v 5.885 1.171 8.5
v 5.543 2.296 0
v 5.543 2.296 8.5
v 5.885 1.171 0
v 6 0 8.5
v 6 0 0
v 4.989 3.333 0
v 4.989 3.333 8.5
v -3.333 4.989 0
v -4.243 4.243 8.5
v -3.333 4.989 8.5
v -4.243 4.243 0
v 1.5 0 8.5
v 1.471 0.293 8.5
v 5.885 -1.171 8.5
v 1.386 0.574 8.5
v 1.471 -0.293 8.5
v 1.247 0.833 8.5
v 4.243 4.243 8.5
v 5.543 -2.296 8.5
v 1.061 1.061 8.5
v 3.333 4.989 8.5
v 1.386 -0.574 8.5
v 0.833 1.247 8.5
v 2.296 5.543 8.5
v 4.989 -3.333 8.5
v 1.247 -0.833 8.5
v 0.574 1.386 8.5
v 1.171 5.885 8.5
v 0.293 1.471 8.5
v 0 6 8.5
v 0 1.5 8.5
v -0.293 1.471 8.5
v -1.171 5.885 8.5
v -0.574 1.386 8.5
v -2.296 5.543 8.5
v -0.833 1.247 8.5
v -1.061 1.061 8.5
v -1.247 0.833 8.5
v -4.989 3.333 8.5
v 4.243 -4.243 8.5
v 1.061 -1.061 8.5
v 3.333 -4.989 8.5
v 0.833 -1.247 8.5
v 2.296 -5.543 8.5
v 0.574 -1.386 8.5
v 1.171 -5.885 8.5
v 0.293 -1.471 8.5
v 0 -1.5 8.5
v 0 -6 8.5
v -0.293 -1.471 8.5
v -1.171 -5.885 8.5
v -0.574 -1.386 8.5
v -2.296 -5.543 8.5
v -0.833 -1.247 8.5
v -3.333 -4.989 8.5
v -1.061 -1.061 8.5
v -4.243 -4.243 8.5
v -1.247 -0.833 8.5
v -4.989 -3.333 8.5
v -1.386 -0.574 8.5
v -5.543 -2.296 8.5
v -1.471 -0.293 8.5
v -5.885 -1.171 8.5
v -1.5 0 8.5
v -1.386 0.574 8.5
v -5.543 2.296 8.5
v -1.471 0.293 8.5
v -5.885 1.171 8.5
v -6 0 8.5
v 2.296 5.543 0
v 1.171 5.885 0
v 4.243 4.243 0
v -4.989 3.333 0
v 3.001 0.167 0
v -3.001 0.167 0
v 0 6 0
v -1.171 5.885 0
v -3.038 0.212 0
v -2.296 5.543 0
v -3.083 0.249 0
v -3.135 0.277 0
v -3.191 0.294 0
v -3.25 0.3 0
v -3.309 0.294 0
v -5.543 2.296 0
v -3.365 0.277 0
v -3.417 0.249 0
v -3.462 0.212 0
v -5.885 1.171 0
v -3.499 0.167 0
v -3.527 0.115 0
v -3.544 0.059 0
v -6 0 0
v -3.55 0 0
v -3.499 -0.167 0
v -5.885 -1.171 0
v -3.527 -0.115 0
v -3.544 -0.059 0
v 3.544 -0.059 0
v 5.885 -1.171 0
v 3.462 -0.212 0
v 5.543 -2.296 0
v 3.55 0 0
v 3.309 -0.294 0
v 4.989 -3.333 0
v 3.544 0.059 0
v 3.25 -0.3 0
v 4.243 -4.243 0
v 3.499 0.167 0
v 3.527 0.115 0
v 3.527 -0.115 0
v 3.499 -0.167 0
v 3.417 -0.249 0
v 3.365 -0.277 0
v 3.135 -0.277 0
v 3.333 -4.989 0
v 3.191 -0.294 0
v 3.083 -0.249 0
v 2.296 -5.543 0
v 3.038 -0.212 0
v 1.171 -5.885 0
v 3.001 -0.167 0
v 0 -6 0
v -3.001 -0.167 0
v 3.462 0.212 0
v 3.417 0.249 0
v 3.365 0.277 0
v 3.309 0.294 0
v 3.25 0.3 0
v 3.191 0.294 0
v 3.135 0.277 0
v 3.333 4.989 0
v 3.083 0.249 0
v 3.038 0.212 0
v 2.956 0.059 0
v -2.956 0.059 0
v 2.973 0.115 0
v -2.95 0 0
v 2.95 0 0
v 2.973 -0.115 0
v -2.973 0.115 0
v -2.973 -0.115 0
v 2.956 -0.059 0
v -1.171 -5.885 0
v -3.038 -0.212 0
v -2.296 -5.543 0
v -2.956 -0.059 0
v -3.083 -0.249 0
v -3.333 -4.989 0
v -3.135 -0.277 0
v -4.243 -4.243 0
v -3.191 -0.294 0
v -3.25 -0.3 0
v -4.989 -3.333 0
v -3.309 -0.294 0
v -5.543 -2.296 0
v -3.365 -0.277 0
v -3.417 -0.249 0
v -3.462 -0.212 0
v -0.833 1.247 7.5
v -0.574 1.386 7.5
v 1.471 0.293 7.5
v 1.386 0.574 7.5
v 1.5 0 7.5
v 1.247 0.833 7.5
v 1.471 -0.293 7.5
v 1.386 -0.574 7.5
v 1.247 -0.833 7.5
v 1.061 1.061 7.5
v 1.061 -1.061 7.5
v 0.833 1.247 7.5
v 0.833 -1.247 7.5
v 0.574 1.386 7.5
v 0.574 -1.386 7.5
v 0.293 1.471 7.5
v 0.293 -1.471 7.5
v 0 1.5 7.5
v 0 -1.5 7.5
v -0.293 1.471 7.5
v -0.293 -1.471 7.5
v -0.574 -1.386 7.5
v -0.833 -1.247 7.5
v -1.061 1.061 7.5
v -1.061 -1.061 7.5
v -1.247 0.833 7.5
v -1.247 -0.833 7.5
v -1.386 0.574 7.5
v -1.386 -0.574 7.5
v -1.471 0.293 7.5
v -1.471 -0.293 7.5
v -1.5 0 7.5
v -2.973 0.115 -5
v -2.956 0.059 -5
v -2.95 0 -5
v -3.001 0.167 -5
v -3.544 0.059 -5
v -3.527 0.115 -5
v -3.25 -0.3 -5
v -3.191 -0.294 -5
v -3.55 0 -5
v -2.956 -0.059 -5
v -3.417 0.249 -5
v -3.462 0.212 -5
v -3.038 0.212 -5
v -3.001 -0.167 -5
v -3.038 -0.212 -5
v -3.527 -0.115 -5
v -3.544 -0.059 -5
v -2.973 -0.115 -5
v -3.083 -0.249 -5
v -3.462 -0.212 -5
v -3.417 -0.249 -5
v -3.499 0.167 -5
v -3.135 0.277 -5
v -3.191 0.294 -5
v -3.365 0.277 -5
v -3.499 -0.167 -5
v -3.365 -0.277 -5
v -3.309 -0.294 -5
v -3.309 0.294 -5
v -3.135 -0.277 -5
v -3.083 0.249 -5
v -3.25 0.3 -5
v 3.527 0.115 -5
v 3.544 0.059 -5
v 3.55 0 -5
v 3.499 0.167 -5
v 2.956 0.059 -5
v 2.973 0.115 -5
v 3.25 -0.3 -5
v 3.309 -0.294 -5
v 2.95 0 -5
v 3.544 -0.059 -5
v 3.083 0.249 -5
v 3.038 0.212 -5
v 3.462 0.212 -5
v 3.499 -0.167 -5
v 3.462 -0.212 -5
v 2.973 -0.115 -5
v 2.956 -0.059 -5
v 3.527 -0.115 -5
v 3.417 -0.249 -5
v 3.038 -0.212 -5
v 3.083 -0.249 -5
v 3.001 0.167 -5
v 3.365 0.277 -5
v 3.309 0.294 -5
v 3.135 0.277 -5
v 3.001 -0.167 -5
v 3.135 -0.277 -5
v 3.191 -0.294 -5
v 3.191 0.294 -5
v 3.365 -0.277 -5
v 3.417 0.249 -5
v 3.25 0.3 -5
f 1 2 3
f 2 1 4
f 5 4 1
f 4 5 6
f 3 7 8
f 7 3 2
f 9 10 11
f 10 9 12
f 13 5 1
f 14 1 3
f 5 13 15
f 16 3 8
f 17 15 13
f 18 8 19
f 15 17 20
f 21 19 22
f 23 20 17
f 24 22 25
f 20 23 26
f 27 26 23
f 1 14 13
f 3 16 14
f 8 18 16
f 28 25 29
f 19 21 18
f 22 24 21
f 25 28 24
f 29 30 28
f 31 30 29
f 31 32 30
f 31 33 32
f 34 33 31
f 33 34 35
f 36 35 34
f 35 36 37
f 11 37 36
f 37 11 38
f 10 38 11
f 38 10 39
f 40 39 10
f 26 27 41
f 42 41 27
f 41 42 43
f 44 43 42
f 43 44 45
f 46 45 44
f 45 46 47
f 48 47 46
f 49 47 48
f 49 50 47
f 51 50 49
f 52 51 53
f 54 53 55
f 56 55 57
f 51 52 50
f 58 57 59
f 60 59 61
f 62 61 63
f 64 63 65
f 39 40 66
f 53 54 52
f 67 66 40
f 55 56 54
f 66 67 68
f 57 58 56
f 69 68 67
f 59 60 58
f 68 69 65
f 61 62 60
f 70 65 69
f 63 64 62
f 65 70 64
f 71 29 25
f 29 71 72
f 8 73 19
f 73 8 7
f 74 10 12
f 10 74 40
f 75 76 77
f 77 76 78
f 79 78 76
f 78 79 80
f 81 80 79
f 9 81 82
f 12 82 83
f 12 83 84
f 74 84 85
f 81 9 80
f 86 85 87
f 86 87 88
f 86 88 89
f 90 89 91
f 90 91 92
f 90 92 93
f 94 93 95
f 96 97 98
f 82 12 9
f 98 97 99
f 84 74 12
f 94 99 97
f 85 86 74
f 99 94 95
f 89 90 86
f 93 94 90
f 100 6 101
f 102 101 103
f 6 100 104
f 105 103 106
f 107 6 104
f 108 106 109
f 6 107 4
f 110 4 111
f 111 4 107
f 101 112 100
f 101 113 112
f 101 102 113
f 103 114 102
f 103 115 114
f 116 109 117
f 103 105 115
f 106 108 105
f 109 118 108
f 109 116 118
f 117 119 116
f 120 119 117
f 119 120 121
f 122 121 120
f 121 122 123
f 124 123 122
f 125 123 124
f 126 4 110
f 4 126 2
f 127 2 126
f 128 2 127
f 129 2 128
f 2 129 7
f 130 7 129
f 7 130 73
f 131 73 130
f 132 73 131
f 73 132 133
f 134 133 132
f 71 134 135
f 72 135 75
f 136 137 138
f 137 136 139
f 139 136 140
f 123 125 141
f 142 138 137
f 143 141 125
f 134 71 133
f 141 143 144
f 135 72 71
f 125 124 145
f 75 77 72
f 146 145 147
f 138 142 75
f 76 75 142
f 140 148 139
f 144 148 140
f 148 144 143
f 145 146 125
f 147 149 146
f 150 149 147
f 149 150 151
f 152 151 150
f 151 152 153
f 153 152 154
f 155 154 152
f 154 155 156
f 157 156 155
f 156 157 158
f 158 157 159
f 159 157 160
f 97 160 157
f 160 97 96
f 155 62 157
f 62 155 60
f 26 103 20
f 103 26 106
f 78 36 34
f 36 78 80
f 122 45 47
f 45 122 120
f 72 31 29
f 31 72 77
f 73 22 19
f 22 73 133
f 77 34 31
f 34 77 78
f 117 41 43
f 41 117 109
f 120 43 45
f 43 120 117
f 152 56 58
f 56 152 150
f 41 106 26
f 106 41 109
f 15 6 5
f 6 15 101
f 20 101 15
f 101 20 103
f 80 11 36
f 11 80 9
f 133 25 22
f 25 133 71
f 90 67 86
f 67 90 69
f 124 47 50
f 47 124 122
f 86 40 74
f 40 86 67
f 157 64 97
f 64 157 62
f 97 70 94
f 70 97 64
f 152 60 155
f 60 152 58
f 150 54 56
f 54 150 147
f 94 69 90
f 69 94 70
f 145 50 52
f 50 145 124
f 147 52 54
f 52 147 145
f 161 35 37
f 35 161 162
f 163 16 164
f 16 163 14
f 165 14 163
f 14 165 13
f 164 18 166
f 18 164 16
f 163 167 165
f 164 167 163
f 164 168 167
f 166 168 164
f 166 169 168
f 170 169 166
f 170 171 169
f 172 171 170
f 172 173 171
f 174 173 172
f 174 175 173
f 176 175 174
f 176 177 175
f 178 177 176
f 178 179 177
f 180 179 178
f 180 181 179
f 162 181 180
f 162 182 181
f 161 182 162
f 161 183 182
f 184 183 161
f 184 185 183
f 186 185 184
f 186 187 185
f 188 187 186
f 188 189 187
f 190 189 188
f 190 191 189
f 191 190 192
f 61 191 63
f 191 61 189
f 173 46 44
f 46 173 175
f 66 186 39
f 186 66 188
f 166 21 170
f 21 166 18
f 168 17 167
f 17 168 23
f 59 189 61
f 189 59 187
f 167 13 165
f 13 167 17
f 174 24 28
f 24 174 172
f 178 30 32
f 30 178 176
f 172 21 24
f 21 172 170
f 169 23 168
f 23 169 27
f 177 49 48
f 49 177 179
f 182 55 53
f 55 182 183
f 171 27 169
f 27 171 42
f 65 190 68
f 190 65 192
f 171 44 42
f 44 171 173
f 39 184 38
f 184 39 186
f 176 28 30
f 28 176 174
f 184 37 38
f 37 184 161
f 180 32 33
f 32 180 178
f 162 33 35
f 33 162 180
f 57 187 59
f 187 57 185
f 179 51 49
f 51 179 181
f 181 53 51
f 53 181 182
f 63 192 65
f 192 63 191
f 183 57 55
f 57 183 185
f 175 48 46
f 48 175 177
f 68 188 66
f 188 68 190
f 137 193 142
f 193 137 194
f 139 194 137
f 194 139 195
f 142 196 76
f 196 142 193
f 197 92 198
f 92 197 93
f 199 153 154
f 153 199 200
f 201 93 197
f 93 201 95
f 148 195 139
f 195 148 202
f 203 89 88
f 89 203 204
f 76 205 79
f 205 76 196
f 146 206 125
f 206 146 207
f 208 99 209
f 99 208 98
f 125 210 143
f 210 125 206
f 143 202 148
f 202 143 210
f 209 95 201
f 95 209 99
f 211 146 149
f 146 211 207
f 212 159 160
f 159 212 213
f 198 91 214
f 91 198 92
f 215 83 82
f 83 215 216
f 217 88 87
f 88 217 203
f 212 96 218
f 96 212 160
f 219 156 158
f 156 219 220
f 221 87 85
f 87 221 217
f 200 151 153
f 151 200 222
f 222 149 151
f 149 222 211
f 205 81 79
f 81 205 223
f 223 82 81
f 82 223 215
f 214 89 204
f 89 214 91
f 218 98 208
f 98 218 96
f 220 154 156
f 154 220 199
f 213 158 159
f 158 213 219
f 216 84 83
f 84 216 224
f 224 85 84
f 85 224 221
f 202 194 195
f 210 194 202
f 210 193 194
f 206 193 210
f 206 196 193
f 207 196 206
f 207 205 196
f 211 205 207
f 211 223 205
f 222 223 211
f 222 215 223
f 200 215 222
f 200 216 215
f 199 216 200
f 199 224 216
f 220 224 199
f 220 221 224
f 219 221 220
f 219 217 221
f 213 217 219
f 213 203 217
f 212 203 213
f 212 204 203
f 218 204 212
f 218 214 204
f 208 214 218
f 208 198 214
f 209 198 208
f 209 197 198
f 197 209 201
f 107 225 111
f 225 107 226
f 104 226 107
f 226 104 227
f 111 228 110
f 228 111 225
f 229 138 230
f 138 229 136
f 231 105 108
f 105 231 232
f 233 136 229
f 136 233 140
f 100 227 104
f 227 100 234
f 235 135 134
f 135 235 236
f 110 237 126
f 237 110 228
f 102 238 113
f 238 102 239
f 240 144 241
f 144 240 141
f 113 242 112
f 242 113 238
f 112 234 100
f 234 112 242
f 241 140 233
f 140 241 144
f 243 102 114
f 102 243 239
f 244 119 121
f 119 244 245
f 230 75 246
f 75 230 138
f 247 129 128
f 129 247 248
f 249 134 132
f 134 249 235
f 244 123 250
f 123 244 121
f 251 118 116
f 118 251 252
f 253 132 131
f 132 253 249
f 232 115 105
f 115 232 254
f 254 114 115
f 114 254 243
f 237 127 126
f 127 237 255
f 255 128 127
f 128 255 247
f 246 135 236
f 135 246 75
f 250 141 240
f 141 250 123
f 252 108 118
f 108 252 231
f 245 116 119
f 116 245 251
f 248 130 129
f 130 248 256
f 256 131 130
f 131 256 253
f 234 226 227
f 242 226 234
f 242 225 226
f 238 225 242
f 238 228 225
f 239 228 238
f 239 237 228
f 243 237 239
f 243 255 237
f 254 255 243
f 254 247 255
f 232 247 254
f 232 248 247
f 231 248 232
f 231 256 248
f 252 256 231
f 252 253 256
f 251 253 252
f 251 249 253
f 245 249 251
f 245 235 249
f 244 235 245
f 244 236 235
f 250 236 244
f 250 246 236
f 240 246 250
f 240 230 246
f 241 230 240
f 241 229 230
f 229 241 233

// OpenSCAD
bod_d = 12;
bod_z = 8.5;

pin_d = 0.6;
pin_z = 5;

$fn=32;

module pin_at(x,y) {
     translate( [x, y, -pin_z])
	  cylinder( h=pin_z, d=pin_d);
}

module speaker() {
     difference() {
	  color("darkgrey")
	       cylinder( d=bod_d, h=bod_z);
	  translate( [0, 0, bod_z-1])
	       cylinder( d=3, h=1.5);
     }
     pin_at( -3.25, 0);
     pin_at( 3.25, 0);
}

speaker();
